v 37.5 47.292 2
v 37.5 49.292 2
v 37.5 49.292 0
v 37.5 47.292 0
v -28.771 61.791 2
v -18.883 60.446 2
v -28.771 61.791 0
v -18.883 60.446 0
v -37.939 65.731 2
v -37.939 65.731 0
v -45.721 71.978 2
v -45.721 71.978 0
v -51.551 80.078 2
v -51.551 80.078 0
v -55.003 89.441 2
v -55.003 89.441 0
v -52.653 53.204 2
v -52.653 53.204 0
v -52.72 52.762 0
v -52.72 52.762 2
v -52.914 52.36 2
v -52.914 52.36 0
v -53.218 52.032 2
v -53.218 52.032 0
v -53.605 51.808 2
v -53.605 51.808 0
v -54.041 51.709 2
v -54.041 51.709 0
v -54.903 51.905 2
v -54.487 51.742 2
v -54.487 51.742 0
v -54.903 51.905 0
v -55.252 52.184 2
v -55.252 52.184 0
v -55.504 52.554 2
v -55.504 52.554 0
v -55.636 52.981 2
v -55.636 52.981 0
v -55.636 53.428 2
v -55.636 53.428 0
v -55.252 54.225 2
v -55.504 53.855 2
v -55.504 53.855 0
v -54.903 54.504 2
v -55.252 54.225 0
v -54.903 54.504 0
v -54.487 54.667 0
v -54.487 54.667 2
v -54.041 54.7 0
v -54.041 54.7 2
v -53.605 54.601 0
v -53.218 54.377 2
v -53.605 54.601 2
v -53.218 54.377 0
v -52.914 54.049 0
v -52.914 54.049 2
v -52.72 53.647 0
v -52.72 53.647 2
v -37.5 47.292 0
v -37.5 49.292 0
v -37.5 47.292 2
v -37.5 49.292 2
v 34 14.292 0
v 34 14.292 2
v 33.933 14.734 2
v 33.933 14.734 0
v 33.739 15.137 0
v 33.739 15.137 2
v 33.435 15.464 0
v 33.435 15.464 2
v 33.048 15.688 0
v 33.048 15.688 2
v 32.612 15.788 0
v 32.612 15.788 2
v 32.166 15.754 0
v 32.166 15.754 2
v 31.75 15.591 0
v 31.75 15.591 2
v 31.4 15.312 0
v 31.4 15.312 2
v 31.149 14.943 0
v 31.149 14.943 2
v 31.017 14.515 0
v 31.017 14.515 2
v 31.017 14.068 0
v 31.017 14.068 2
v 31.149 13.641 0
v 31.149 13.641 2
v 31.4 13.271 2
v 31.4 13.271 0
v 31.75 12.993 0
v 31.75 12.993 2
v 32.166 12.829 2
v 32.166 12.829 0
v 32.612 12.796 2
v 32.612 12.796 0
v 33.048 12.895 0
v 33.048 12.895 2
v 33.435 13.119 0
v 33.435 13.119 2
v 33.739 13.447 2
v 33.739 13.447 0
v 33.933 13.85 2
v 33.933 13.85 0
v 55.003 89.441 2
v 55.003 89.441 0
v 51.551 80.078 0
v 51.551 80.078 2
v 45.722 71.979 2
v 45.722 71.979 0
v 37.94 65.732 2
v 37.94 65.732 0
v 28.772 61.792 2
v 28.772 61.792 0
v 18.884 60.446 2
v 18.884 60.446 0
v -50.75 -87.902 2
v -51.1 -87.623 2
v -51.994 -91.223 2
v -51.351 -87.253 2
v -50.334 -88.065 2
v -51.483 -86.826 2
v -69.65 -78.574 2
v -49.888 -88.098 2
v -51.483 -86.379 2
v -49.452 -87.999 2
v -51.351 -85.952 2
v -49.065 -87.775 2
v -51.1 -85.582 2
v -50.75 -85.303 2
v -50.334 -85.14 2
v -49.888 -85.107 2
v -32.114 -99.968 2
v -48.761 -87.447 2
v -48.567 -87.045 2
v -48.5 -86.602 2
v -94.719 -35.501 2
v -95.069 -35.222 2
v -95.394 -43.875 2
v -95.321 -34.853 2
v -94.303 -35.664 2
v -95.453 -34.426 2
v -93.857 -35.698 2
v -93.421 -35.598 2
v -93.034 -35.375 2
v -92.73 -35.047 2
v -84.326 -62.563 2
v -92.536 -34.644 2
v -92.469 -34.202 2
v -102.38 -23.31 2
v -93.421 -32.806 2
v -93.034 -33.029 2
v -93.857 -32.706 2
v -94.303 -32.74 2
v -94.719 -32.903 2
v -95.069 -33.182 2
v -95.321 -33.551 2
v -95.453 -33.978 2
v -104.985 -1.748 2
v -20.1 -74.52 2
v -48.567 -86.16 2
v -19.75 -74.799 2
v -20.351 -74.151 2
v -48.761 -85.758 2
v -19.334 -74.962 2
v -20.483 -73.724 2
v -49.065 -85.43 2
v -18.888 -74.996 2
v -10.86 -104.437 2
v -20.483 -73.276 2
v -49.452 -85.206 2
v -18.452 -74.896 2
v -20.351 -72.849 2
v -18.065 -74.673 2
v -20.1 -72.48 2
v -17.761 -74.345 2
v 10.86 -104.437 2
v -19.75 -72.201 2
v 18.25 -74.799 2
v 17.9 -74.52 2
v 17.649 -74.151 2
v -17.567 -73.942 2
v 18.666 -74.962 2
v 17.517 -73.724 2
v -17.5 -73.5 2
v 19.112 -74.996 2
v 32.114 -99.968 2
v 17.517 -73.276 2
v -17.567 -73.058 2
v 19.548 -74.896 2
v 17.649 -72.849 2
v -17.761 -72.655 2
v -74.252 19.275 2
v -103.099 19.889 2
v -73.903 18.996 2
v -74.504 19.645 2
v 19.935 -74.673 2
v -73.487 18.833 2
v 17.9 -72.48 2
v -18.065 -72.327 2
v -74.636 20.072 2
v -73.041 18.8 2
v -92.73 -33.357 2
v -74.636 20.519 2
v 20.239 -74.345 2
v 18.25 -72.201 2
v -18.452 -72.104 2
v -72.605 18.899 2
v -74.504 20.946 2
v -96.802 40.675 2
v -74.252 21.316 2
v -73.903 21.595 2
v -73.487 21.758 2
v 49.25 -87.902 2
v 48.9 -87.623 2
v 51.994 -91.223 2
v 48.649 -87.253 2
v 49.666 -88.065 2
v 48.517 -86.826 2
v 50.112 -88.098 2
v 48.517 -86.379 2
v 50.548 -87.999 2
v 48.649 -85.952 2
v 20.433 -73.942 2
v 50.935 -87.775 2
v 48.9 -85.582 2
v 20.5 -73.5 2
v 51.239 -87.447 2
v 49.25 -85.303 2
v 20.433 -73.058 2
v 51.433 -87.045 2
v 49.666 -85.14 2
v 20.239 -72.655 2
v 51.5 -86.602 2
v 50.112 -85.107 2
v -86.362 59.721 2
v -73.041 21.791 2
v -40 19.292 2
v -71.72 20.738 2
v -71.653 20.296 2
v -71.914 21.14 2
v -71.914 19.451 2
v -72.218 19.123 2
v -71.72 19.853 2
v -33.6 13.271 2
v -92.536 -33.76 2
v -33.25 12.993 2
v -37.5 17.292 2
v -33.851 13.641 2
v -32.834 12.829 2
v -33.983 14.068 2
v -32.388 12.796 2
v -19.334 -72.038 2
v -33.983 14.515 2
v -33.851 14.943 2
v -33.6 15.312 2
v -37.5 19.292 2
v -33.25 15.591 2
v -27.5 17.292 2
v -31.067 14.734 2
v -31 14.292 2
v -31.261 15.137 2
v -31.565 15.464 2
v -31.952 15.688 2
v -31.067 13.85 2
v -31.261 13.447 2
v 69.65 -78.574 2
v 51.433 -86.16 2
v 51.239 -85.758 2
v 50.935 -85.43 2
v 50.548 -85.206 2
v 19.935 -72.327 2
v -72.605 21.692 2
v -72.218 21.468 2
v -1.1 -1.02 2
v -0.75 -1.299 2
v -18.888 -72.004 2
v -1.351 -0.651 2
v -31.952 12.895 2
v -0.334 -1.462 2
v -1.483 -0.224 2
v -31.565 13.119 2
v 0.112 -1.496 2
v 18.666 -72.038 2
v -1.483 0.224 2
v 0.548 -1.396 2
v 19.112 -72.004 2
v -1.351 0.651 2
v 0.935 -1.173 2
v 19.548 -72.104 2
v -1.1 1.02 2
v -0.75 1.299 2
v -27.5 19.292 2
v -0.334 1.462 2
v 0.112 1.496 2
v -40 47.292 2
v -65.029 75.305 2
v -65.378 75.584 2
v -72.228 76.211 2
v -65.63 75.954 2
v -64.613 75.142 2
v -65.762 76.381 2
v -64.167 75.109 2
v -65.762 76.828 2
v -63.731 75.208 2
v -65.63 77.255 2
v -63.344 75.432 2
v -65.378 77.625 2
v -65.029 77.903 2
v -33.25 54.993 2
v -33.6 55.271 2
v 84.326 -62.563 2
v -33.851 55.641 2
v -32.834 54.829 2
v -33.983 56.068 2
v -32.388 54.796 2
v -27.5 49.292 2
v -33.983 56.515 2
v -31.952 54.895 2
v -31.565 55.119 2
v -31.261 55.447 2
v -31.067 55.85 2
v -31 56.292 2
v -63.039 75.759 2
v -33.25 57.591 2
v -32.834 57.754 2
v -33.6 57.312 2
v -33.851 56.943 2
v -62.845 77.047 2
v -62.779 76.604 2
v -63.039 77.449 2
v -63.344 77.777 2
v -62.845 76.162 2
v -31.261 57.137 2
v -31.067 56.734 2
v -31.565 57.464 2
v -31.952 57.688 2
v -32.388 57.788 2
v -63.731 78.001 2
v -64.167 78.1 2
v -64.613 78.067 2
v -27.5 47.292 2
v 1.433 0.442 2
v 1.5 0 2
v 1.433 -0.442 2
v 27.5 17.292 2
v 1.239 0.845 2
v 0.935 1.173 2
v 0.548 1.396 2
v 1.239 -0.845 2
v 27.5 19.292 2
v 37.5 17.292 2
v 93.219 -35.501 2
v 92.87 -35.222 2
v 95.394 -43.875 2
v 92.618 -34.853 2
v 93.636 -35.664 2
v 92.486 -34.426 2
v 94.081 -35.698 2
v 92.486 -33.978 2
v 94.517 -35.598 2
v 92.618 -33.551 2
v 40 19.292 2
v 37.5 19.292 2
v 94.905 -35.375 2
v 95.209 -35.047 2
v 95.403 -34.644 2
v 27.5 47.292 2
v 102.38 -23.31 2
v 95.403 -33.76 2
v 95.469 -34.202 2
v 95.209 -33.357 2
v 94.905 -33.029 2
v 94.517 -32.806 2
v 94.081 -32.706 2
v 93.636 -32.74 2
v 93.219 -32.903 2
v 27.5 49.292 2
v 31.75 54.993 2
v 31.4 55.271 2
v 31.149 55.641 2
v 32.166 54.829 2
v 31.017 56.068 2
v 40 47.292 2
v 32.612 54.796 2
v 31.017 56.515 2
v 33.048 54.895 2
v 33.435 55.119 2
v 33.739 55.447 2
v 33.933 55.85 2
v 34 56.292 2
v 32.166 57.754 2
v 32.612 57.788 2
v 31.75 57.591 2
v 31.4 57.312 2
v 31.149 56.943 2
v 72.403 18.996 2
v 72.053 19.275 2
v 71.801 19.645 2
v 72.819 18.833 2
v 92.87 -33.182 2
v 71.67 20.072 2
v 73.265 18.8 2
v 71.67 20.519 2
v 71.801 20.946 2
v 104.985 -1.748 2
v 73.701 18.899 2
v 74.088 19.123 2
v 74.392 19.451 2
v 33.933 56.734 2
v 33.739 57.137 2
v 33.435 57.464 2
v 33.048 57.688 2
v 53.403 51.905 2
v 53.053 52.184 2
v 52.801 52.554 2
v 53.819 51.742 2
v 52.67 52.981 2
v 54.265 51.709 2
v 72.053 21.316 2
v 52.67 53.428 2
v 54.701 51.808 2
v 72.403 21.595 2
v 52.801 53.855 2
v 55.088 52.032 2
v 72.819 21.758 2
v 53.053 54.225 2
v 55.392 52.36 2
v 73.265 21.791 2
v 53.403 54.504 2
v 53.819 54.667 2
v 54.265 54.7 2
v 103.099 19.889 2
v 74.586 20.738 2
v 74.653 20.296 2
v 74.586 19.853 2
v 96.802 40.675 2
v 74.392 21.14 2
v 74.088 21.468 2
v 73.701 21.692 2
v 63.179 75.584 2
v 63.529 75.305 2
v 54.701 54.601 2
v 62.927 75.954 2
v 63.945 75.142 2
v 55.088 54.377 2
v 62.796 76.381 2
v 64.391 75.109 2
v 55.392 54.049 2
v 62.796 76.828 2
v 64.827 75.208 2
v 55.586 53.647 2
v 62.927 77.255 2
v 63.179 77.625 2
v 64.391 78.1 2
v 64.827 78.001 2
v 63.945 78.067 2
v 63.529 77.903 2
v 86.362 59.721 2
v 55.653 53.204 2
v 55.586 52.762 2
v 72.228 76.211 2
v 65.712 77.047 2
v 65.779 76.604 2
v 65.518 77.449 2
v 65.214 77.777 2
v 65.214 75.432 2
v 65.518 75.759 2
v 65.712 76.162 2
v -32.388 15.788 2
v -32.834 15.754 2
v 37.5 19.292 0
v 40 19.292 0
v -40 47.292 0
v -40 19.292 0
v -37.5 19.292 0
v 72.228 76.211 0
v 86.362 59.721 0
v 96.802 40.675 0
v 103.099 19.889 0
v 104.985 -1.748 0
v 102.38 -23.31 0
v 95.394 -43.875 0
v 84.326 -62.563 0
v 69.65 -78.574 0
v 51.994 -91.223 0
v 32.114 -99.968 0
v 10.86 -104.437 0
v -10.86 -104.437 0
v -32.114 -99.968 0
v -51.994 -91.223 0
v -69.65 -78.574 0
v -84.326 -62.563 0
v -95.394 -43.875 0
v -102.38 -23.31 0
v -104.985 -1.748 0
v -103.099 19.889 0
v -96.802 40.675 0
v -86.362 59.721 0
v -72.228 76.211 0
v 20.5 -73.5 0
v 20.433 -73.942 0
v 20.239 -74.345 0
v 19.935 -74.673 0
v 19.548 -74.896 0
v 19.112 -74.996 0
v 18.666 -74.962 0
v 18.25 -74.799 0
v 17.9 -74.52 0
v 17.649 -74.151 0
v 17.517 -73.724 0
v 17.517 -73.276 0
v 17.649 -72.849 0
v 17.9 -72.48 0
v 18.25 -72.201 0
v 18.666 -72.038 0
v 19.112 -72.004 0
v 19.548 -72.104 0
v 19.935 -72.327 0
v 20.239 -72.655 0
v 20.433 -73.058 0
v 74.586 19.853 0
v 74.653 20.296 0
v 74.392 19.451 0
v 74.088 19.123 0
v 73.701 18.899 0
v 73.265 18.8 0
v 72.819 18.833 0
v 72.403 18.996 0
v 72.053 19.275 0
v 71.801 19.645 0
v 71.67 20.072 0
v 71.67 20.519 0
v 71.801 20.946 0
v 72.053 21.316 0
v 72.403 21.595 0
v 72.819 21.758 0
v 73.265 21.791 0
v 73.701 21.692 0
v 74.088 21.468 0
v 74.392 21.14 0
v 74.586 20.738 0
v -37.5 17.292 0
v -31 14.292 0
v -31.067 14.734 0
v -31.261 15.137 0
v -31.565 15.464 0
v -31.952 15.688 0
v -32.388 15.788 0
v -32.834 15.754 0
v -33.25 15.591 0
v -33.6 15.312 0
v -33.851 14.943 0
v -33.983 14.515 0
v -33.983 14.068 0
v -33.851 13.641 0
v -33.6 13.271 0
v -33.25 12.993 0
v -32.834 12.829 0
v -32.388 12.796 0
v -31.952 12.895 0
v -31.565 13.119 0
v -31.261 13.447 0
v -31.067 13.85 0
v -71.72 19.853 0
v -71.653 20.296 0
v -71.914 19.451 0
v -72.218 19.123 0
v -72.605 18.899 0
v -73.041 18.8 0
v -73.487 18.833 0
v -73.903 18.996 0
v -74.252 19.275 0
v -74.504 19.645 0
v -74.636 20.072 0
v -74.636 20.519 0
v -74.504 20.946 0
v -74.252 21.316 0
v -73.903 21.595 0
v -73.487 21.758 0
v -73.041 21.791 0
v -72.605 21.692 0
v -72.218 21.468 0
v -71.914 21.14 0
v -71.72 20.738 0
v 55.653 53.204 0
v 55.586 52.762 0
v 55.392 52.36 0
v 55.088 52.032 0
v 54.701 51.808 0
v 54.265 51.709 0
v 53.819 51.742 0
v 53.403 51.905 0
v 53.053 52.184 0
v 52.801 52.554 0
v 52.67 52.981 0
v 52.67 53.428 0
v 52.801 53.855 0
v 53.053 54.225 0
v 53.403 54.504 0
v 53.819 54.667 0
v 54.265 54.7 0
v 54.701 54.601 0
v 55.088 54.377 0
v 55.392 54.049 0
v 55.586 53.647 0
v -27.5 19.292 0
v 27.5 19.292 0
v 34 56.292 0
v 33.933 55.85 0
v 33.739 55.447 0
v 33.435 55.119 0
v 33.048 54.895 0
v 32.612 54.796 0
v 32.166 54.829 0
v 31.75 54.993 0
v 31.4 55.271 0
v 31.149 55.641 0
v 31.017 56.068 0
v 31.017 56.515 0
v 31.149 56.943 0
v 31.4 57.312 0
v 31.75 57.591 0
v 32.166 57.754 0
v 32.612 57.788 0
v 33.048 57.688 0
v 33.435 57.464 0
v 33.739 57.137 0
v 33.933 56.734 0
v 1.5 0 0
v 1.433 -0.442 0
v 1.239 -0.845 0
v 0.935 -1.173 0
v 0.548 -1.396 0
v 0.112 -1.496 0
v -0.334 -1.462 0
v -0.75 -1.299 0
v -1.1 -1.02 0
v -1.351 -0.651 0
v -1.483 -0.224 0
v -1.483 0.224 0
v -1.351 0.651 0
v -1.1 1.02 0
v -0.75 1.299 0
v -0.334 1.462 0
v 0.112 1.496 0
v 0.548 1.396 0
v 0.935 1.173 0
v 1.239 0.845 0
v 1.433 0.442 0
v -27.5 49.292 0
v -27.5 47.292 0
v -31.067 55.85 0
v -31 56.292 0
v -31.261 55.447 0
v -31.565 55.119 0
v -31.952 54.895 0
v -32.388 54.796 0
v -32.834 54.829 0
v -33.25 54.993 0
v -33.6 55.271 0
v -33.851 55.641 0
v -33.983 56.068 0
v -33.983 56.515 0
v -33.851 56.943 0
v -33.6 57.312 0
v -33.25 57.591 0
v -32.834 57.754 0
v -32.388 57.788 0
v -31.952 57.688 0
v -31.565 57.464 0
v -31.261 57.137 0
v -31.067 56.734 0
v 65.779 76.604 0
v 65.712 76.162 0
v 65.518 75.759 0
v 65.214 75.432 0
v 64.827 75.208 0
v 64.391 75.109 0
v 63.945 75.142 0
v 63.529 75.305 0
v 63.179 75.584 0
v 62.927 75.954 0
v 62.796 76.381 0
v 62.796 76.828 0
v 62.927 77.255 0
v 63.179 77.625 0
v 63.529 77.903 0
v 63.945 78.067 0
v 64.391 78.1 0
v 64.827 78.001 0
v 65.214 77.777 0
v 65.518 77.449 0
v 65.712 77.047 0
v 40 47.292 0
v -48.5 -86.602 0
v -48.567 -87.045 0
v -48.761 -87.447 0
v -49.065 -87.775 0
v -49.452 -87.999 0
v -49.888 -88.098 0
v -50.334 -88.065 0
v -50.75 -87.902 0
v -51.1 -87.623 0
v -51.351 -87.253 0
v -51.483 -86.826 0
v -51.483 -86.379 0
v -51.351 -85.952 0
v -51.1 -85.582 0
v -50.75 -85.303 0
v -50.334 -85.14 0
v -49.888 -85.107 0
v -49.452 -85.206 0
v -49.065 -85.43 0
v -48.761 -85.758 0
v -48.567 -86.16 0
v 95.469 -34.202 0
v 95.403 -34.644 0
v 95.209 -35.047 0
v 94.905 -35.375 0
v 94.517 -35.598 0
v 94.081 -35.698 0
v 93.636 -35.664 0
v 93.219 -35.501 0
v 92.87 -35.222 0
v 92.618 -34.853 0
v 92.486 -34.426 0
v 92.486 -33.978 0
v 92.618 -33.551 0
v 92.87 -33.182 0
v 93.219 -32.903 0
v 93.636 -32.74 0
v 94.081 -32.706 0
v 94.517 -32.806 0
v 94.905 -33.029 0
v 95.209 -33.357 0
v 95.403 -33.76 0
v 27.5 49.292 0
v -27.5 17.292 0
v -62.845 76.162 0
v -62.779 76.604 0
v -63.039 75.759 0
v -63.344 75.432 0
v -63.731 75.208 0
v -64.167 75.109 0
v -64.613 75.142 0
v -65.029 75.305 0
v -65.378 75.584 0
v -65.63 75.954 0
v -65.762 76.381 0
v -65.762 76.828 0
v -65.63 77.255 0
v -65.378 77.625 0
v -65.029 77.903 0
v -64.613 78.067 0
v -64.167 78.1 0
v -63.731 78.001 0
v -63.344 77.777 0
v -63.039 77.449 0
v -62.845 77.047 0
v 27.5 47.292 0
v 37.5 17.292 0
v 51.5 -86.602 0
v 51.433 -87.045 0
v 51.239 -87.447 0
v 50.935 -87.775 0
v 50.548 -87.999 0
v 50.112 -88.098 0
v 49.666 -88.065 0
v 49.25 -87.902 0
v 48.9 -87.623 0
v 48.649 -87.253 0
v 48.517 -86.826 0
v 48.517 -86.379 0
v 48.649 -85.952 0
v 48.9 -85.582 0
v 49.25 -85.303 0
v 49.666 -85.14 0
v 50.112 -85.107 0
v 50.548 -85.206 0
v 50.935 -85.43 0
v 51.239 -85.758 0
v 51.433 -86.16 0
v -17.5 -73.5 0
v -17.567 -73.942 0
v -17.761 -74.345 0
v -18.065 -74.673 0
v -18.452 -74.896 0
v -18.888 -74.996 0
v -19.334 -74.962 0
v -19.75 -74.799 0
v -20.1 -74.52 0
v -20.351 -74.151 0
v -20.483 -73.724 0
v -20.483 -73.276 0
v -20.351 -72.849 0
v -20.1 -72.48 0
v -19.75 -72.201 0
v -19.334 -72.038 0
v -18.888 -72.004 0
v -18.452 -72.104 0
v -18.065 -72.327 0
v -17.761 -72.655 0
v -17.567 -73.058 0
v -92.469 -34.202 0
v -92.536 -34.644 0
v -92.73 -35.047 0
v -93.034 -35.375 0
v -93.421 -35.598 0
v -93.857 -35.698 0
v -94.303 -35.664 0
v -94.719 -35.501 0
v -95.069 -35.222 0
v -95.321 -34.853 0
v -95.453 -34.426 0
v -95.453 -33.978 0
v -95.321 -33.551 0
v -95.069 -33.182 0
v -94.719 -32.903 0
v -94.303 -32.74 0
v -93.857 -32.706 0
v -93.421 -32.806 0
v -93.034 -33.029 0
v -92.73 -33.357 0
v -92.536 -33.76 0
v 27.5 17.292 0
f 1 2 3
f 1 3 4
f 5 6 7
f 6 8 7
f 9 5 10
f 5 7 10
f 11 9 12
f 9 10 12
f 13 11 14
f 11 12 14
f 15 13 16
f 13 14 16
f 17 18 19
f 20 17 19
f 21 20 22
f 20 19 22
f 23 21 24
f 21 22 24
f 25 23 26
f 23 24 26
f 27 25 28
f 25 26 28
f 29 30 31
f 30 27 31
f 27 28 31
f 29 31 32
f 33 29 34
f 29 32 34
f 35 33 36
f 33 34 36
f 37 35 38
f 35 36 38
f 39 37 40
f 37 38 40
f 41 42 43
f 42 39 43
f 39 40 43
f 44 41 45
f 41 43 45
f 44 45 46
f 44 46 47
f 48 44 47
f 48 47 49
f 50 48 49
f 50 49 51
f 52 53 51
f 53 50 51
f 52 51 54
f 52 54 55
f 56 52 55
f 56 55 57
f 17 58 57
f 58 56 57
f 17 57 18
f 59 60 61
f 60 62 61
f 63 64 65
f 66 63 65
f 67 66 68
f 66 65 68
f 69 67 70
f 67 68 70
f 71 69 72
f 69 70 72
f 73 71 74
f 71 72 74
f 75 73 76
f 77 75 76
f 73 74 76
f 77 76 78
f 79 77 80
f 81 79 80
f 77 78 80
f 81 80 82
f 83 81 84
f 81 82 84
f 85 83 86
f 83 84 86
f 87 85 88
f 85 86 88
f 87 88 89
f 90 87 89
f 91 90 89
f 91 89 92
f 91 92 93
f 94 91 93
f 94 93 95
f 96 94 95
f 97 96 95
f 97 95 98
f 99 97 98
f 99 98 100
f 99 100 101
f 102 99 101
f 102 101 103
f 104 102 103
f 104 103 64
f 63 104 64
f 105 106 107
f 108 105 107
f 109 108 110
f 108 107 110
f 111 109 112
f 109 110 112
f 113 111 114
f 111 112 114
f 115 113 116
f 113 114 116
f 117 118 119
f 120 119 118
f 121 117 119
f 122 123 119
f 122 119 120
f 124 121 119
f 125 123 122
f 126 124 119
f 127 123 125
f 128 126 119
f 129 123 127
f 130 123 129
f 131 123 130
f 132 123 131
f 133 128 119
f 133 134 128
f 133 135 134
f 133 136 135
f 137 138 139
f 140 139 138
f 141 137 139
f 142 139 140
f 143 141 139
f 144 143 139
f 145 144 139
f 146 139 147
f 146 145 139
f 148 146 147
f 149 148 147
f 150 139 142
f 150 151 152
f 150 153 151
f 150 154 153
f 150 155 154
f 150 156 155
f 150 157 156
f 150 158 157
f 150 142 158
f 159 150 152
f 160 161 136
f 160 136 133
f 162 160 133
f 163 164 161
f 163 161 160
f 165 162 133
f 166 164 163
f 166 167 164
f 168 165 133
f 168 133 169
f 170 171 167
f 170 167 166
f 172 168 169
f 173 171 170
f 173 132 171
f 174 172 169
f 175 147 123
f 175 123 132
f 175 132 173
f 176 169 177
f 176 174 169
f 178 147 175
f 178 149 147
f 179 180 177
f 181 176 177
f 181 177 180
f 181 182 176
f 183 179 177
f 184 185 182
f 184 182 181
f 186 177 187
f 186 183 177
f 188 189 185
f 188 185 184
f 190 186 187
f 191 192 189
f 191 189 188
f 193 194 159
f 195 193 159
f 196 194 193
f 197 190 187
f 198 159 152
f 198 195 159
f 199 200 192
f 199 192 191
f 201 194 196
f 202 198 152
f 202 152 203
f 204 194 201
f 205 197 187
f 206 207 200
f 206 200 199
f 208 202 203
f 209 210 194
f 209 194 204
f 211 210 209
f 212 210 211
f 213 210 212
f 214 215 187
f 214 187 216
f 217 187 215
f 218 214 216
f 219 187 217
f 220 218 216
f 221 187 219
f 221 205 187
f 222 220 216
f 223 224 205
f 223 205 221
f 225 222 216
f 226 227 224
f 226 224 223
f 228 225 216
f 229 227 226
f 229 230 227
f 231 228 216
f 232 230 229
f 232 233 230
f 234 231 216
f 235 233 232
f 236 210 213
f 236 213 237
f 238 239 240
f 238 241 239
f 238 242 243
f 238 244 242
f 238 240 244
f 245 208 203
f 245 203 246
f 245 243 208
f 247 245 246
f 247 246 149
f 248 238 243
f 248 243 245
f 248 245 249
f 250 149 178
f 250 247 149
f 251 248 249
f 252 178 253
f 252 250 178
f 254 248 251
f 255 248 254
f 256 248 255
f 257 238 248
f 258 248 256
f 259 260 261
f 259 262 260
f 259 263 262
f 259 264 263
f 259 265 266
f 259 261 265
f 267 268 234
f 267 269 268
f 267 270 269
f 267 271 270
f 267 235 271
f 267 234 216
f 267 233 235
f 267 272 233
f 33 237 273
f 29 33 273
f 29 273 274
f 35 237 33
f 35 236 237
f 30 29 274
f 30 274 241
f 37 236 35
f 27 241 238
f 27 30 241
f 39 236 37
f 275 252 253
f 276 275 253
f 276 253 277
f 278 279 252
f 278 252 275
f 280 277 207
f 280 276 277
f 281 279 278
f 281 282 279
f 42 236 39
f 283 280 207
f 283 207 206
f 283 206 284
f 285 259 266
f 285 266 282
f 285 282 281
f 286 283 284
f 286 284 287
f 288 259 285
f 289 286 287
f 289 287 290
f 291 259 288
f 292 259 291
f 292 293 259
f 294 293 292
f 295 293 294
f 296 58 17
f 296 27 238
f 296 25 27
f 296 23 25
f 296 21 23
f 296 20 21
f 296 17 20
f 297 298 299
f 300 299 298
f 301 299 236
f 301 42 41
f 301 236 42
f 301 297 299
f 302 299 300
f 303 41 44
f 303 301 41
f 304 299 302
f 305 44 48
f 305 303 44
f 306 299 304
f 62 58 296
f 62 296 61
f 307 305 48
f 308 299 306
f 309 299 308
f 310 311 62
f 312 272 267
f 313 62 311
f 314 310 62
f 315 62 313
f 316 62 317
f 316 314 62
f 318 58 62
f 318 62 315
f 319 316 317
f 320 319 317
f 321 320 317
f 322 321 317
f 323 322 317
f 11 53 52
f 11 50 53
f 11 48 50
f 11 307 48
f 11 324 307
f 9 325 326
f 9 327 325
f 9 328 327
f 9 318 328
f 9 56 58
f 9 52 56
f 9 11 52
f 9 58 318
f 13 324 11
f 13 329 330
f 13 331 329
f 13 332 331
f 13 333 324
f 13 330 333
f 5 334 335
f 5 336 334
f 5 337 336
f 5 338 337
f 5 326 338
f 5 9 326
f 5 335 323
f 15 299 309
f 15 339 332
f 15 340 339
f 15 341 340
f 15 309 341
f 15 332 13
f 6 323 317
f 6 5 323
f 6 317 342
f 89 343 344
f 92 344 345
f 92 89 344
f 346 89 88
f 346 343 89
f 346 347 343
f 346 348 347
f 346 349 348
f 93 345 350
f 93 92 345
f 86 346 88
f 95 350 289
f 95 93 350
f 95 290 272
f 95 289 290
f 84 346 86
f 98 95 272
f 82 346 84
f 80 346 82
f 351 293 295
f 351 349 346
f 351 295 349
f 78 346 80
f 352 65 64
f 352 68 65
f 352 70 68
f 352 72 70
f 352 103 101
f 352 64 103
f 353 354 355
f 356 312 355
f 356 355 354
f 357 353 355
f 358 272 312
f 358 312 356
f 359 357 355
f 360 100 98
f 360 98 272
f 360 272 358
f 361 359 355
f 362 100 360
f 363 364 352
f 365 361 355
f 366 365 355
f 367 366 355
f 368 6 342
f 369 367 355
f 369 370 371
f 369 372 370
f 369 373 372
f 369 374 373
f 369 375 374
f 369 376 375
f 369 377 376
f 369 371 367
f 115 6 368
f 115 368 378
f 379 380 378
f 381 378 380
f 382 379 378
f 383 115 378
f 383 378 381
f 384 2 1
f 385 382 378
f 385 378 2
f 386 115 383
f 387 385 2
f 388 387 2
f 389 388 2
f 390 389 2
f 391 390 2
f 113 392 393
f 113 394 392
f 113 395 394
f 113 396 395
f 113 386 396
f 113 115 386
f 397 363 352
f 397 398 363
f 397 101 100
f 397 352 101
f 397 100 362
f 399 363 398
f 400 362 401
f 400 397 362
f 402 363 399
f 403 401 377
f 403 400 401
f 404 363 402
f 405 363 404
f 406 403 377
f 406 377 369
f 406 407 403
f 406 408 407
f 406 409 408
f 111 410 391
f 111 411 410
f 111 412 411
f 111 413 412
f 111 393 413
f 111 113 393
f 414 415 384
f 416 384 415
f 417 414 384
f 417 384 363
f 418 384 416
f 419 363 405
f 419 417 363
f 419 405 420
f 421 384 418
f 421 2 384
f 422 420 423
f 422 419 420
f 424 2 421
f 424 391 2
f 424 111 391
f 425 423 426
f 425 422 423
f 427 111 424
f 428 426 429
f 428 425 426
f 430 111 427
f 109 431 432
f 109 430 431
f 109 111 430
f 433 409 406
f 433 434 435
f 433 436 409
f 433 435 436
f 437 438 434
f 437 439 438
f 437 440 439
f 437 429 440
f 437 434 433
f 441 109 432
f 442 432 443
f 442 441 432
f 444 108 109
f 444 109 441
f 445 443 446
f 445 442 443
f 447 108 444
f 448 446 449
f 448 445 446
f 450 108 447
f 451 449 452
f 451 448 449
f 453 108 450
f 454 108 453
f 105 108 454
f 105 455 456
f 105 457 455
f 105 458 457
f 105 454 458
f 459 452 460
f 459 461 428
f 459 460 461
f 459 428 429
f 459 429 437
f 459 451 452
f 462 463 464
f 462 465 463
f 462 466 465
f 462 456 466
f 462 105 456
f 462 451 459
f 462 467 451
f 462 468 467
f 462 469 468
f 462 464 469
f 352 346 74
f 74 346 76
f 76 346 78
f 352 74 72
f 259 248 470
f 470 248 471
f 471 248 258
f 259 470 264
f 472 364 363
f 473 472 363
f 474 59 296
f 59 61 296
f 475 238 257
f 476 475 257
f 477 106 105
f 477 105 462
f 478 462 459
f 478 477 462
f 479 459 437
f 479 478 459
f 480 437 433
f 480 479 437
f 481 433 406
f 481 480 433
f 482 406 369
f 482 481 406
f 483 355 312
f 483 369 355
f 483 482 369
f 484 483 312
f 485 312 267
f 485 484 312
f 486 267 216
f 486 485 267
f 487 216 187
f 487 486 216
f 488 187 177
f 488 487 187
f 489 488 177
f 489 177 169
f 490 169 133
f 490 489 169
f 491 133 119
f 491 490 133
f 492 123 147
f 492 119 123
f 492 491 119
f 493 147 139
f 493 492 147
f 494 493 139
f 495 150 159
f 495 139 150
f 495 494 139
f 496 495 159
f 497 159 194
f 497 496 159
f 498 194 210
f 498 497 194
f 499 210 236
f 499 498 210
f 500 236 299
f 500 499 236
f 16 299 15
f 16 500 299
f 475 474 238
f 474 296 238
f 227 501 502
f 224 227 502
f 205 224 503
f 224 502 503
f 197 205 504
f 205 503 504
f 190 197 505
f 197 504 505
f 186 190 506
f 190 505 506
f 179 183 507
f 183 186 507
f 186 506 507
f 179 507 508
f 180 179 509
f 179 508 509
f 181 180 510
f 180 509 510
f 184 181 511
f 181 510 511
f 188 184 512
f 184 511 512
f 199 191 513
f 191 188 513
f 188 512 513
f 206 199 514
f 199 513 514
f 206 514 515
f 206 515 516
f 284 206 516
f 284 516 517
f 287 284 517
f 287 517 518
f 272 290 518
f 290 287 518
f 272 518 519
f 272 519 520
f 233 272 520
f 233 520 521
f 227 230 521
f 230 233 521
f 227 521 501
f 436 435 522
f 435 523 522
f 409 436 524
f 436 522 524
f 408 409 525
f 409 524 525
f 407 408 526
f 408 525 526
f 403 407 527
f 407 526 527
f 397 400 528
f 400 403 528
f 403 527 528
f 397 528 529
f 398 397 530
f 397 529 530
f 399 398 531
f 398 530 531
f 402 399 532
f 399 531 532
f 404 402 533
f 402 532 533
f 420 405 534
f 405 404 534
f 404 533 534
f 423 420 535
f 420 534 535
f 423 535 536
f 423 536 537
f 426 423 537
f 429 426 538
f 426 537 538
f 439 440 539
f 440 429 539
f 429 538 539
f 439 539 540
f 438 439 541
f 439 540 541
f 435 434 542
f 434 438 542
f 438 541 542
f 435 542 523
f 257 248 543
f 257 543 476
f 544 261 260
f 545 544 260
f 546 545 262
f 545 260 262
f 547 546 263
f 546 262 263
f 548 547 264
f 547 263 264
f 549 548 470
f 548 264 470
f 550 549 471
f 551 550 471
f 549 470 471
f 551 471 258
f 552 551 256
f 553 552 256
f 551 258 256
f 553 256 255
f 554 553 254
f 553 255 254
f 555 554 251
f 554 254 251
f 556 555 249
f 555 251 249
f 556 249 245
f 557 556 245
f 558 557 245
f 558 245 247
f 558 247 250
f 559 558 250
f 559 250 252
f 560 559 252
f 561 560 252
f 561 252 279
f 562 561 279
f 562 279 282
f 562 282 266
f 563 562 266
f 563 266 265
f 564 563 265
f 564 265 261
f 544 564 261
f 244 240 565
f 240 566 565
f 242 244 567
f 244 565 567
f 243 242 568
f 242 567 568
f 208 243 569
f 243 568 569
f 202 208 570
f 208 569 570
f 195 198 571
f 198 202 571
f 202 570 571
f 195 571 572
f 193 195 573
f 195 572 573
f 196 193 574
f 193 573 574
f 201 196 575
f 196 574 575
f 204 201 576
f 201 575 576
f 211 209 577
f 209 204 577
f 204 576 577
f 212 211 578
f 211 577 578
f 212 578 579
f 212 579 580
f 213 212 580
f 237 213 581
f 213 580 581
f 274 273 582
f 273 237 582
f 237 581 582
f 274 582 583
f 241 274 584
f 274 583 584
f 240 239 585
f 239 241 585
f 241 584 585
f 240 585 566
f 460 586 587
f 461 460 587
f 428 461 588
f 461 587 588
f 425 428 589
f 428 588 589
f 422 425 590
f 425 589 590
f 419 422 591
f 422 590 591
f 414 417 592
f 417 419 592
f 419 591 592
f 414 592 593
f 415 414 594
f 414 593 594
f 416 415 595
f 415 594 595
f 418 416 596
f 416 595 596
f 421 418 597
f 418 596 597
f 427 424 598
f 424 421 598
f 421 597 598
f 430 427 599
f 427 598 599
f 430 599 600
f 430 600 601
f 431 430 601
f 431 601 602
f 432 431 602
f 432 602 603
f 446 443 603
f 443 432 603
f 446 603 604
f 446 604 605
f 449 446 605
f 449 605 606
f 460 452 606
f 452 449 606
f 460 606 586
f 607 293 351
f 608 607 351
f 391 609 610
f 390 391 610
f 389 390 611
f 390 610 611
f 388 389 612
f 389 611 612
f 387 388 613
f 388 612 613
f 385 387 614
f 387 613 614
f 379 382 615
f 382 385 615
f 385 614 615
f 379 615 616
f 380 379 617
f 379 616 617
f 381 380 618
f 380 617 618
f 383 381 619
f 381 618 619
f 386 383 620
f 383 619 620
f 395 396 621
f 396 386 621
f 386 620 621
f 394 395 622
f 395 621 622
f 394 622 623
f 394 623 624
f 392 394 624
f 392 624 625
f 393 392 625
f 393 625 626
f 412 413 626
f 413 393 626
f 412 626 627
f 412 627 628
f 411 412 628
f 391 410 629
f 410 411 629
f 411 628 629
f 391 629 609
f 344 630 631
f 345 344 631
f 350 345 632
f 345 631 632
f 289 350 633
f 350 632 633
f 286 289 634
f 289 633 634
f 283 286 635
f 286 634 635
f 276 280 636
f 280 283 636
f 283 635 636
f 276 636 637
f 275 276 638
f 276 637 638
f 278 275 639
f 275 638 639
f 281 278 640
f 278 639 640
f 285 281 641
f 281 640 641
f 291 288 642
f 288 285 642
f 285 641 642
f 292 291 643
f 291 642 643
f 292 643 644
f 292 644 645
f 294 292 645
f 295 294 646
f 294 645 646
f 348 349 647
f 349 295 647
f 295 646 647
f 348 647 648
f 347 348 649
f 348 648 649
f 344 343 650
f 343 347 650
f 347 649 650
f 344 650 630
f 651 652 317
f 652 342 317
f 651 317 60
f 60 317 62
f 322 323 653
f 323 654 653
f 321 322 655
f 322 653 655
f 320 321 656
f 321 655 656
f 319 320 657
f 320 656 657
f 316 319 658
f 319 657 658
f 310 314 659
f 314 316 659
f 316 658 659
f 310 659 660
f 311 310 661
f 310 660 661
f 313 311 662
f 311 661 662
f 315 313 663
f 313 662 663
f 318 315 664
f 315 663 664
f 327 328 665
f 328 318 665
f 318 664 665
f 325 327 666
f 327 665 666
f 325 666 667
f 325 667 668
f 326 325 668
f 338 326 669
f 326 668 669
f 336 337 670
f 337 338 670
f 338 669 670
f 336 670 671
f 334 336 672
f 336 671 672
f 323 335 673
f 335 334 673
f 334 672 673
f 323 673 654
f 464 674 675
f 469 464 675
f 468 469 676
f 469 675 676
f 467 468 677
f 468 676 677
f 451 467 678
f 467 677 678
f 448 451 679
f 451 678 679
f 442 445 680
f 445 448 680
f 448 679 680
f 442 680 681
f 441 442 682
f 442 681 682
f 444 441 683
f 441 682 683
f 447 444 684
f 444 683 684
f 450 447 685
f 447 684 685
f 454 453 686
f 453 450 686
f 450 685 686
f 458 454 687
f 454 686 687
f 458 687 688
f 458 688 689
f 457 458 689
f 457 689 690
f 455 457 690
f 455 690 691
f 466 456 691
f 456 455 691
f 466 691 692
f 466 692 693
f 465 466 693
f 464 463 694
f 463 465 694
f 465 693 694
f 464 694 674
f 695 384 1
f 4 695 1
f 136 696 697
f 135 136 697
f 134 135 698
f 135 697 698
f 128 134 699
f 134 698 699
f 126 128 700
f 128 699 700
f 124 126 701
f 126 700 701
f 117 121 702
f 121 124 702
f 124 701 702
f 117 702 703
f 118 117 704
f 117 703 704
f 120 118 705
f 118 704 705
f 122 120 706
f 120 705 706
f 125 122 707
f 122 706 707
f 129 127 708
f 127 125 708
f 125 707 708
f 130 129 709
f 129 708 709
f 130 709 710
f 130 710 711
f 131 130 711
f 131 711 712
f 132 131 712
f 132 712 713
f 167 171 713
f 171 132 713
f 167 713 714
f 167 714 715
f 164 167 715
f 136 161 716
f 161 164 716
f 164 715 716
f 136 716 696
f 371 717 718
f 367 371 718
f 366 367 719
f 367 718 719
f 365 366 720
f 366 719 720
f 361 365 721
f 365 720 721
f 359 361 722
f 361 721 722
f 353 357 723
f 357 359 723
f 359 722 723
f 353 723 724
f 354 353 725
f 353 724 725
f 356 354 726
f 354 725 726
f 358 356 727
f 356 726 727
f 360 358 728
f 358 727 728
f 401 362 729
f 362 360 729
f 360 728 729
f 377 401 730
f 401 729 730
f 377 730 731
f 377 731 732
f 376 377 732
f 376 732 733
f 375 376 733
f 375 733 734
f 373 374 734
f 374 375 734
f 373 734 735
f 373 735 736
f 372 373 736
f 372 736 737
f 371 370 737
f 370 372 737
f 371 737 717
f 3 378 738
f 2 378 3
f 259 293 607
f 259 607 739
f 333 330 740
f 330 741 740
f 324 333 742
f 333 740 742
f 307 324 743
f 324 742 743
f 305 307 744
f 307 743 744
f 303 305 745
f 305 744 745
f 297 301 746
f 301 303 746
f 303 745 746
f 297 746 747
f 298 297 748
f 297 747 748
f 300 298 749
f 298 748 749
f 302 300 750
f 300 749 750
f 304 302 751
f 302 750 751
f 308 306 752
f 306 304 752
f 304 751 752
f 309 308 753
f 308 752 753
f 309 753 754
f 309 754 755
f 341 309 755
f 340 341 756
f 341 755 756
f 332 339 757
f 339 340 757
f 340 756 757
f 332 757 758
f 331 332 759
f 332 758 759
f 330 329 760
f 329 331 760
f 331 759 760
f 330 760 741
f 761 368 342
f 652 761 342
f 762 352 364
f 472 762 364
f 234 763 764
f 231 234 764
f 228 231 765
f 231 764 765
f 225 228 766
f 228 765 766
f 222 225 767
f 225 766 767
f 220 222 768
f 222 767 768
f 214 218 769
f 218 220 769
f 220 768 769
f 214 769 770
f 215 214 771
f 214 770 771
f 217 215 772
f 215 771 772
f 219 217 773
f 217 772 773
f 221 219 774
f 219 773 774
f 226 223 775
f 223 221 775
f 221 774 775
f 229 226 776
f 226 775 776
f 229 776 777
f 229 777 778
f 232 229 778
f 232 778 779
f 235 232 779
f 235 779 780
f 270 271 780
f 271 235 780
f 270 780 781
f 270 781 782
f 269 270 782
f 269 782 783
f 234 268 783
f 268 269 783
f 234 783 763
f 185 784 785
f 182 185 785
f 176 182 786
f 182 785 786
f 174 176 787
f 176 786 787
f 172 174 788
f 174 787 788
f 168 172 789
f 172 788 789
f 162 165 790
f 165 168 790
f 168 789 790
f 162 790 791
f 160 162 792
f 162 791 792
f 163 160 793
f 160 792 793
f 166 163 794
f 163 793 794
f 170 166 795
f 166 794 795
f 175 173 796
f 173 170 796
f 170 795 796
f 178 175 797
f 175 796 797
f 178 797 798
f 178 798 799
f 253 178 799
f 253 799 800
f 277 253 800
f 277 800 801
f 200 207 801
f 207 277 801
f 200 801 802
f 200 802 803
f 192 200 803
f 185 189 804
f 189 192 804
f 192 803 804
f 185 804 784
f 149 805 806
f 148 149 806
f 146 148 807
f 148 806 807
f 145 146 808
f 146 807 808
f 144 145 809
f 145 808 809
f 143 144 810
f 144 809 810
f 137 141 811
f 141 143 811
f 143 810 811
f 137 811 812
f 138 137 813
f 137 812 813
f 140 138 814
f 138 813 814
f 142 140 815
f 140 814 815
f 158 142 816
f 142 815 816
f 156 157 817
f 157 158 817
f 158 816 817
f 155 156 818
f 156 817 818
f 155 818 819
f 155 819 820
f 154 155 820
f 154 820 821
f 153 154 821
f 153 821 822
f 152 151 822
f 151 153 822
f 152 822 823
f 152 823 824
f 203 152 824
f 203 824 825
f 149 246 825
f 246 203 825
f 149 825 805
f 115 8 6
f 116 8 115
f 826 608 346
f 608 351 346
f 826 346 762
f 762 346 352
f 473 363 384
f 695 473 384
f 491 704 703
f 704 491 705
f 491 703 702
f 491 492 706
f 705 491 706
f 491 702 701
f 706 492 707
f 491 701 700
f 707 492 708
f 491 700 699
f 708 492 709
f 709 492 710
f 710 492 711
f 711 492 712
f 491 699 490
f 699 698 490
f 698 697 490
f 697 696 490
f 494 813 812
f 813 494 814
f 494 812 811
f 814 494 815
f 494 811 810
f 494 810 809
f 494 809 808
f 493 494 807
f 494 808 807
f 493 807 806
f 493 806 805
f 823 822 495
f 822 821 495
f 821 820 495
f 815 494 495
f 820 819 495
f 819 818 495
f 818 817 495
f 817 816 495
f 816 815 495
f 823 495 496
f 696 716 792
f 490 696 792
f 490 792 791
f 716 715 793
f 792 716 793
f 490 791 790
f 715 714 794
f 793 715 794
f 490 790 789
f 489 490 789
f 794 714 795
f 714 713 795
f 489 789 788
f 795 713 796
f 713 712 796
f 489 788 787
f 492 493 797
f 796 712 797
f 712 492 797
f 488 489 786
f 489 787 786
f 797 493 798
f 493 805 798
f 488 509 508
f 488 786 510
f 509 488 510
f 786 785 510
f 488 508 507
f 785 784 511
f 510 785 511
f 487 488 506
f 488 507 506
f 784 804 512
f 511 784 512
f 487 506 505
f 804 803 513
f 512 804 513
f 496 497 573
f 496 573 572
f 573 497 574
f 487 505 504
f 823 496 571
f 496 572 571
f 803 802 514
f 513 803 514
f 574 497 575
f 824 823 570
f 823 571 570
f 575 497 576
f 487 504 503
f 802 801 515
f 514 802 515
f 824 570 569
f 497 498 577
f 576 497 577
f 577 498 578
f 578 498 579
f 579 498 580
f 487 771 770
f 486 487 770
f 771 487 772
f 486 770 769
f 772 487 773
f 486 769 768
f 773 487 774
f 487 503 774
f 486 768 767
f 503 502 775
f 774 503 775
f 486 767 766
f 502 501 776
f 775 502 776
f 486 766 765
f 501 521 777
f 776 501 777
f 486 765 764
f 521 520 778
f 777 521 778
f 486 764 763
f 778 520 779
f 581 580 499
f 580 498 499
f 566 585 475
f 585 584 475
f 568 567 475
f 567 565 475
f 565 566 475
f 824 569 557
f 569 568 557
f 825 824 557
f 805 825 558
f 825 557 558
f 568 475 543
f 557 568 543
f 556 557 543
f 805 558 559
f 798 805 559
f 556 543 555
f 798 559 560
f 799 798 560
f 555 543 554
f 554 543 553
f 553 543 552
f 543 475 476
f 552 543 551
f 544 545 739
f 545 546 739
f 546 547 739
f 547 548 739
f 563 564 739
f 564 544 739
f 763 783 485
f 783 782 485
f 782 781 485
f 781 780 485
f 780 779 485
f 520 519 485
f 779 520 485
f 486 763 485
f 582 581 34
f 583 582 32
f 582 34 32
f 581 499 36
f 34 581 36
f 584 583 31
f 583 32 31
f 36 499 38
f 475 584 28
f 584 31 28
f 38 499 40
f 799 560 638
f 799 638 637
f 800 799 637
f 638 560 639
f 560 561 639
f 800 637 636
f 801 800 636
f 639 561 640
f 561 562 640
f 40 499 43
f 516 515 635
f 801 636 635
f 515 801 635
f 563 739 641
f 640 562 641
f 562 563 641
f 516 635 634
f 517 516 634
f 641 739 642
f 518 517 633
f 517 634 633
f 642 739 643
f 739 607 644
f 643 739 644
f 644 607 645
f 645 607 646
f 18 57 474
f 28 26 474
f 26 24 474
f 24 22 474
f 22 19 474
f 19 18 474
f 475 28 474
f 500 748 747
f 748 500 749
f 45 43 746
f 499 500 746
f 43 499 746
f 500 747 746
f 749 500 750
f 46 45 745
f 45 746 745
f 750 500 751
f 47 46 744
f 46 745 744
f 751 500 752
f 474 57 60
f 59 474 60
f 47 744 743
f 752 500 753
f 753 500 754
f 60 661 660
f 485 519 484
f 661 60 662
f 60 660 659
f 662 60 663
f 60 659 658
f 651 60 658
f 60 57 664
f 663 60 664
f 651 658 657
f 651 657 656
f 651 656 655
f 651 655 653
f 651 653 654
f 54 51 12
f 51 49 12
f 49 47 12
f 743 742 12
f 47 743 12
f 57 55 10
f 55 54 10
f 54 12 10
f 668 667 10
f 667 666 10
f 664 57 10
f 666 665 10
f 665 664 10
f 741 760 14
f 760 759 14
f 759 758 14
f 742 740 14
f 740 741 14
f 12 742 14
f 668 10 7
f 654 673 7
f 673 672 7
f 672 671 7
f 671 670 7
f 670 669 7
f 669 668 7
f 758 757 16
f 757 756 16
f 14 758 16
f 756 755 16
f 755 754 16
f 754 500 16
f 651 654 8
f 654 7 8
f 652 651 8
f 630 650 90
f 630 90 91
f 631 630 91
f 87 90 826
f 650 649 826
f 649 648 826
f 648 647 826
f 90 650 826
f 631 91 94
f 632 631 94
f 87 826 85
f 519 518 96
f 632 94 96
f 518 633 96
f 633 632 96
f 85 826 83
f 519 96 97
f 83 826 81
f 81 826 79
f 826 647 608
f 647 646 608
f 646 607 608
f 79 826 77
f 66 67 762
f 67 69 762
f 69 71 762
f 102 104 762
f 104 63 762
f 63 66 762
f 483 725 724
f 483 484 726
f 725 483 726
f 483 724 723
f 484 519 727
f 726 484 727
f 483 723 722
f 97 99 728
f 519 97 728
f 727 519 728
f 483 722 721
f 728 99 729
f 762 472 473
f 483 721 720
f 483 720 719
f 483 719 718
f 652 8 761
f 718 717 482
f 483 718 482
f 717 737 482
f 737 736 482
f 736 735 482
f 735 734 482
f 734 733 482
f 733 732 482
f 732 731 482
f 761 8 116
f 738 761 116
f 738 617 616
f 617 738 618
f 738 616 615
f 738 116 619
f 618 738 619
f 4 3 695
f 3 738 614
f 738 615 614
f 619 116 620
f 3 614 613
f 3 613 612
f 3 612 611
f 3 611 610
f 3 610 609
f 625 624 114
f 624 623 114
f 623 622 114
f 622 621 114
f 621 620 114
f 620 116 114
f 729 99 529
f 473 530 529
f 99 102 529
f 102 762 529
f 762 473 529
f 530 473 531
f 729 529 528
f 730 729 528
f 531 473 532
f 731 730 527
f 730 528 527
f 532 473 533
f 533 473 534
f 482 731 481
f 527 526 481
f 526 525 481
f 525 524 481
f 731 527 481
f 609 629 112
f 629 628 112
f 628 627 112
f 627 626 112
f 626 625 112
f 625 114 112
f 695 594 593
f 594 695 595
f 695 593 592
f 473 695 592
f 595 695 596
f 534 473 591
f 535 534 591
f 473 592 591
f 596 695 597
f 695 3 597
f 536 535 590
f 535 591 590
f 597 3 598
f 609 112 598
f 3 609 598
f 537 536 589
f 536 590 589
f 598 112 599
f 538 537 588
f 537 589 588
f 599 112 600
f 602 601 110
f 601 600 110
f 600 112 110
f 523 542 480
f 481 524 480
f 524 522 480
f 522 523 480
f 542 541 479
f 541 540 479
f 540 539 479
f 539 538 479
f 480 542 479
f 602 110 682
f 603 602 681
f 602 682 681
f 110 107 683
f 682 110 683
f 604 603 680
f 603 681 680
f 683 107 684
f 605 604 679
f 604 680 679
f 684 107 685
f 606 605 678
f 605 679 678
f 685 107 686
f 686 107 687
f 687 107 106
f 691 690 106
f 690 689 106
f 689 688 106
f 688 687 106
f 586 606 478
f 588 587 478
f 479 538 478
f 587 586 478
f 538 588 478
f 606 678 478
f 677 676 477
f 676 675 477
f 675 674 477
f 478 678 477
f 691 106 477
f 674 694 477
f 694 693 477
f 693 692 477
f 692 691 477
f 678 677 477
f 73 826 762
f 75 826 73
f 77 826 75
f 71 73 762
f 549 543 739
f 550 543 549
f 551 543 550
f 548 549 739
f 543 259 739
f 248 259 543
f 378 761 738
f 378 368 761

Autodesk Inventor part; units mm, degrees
ref_plane "YZ Plane" through (0, 0, 0) normal (1, 0, 0) x (0, 1, 0)
ref_plane "XZ Plane" through (0, 0, 0) normal (0, 1, 0) x (-1, 0, 0)
ref_plane "XY Plane" through (0, 0, 0) normal (0, 0, 1) x (1, 0, 0)
sketch "Skizze3" plane through (0, 0, 0) normal (0, 0, 1) x (1, 0, 0)
  arc A0 (-55.0029, 89.4409) -> (55.0029, 89.4409) centre (0, 0) ccw
  line L0 (0, 0) -> (55.0029, 89.4409) construction
  line L1 (0, 0) -> (105, 0) construction
  line L2 (0, 0) -> (-55.0029, 89.4409) construction
  line L3 (-55.0029, 89.4409) -> (-18.8829, 89.4409)
  line L4 (-18.8829, 89.4409) -> (-18.8829, 97.4409)
  arc A1 (-55.0029, 89.4409) -> (-18.8829, 60.4456) centre (-18.8829, 97.4409) ccw
  line L5 (55.0029, 89.4409) -> (18.8829, 89.4409)
  line L6 (18.8829, 89.4409) -> (18.8829, 97.4409)
  arc A2 (18.8839, 60.4456) -> (55.0029, 89.4409) centre (18.8829, 97.4409) ccw
  line L7 (18.8829, 97.4409) -> (18.8839, 60.4456) construction
  line L8 (18.8829, 97.4409) -> (55.0029, 89.4409) construction
  line L9 (-18.8829, 60.4456) -> (18.8839, 60.4456)
  line L10 (0, 0) -> (57.2785, 0) construction
  line L11 (0, 0) -> (57.2785, 0) construction
  line L12 (0, 0) -> (57.279, 0) construction
  line L13 (0, 0) -> (84.4383, 0) construction
  line L14 (0, 0) -> (90, 0) construction
  line L15 (0, 0) -> (90, 0) construction
  line L16 (0, 0) -> (90, 0) construction
  line L17 (0, 0) -> (97, 0) construction
  line L18 (0, 0) -> (97, 0) construction
  line L19 (0, 0) -> (97, 0) construction
  line L20 (0, 0) -> (97, 0) construction
  line L21 (0, 0) -> (100, 0) construction
  circle A3 centre (-93.9693, -34.202) radius 1.5
  line L22 (0, 0) -> (100, 0) construction
  line L23 (0, 0) -> (100, 0) construction
  line L24 (0, 0) -> (100, 0) construction
  circle A4 centre (-50, -86.6025) radius 1.5
  circle A5 centre (93.9693, -34.202) radius 1.5
  circle A6 centre (50, -86.6025) radius 1.5
  line L25 (0, 0) -> (100, 0) construction
  line L26 (0, 0) -> (100, 0) construction
  circle A7 centre (-64.2788, 76.6044) radius 1.5
  circle A8 centre (64.2788, 76.6044) radius 1.5
  line L27 (0, 0) -> (42, 0) construction
  line L28 (0, 0) -> (42, 0) construction
  circle A9 centre (-32.5, 56.2917) radius 1.5
  circle A10 centre (32.5, 56.2917) radius 1.5
  line L29 (-32.5, 56.2917) -> (32.5, 56.2917) construction
  line L30 (-32.5, 56.2917) -> (0, 0) construction
  line L31 (32.5, 56.2917) -> (0, 0) construction
  line L32 (0, 0) -> (0, -73.5) construction
  line L33 (0, -73.5) -> (-19, -73.5) construction
  circle A11 centre (-19, -73.5) radius 1.5
  line L34 (0, 0) -> (-64.2788, 76.6044) construction
  line L35 (0, 0) -> (100, 0) construction
  line L36 (0, 0) -> (64.2788, 76.6044) construction
  line L37 (0, 0) -> (100, 0) construction
  line L38 (0, 0) -> (-93.9693, -34.202) construction
  line L39 (0, 0) -> (100, 0) construction
  line L40 (0, 0) -> (93.9693, -34.202) construction
  line L41 (0, 0) -> (100, 0) construction
  line L42 (0, 0) -> (-50, -86.6025) construction
  line L43 (0, 0) -> (100, 0) construction
  line L44 (0, 0) -> (50, -86.6025) construction
  line L45 (0, 0) -> (100, 0) construction
  circle A12 centre (19, -73.5) radius 1.5
  line L46 (0, 0) -> (63.6529, 36.75) construction
  line L47 (0, 0) -> (73.5, 0) construction
  line L48 (63.6529, 36.75) -> (54.1529, 53.2045) construction
  circle A13 centre (54.1529, 53.2045) radius 1.5
  circle A14 centre (73.1529, 20.2955) radius 1.5
  circle A15 centre (-54.1529, 53.2045) radius 1.5
  circle A16 centre (-73.1529, 20.2955) radius 1.5
  circle A17 centre (0, 0) radius 1.5
  dimension "d22" = 105
  dimension "d23" = 58.41
  dimension "d24" = 63.18
  dimension "d25" = 36.12
  dimension "d26" = 8
  dimension "d27" = 90
  dimension "d28" = 36.12
  dimension "d29" = 8
  dimension "d30" = 90
  dimension "d31" = 77.51
  dimension "d140" = 3
  dimension "d153" = 65
  dimension "d154" = 120
  dimension "d163" = 60
  dimension "d172" = 73.5
  dimension "d173" = 19
  dimension "d174" = 100
  dimension "d175" = 130
  dimension "d176" = 100
  dimension "d177" = 50
  dimension "d178" = 100
  dimension "d179" = 160
  dimension "d180" = 100
  dimension "d181" = 20
  dimension "d182" = 100
  dimension "d183" = 120
  dimension "d184" = 100
  dimension "d185" = 60
  dimension "d186" = 73.5
  dimension "d187" = 30
  dimension "d188" = 19
  dimension "d189" = 3
extrude "Extrusion3" add sketch "Skizze3" along normal blind 2
sketch "Skizze5" plane through (0, 0, 2) normal (0, 0, 1) x (1, 0, 0)
  line L0 (-40, 19.2917) -> (40, 19.2917)
  line L1 (40, 19.2917) -> (40, 47.2917)
  line L2 (40, 47.2917) -> (-40, 47.2917)
  line L3 (-40, 47.2917) -> (-40, 19.2917)
  line L4 (0, 0) -> (0, 47.2917) construction
  line L5 (-37.5, 47.2917) -> (-27.5, 47.2917)
  line L6 (-27.5, 47.2917) -> (-27.5, 49.2917)
  line L7 (-27.5, 49.2917) -> (-37.5, 49.2917)
  line L8 (-37.5, 49.2917) -> (-37.5, 47.2917)
  line L9 (-40, 33.2917) -> (40, 33.2917) construction
  line L10 (-37.5, 19.2917) -> (-27.5, 19.2917)
  line L11 (-27.5, 19.2917) -> (-27.5, 17.2917)
  line L12 (-27.5, 17.2917) -> (-37.5, 17.2917)
  line L13 (-37.5, 17.2917) -> (-37.5, 19.2917)
  line L14 (37.5, 47.2917) -> (27.5, 47.2917)
  line L15 (27.5, 47.2917) -> (27.5, 49.2917)
  line L16 (27.5, 49.2917) -> (37.5, 49.2917)
  line L17 (37.5, 49.2917) -> (37.5, 47.2917)
  line L18 (37.5, 19.2917) -> (27.5, 19.2917)
  line L19 (27.5, 19.2917) -> (27.5, 17.2917)
  line L20 (27.5, 17.2917) -> (37.5, 17.2917)
  line L21 (37.5, 17.2917) -> (37.5, 19.2917)
  circle A0 centre (-32.5, 14.2917) radius 1.5
  circle A1 centre (32.5, 14.2917) radius 1.5
  circle A2 centre (-32.5, 56.2917) radius 1.5 projected
  line L22 (-32.5, 49.2917) -> (-32.5, 56.2917) construction
  dimension "d158" = 80
  dimension "d159" = 28
  dimension "d164" = 10
  dimension "d165" = 2
  dimension "d169" = 3
  dimension "d171" = 7
extrude "Extrusion4" cut sketch "Skizze5" against normal up to next
properties part number "Hauptplatine" material "Kupfer"
